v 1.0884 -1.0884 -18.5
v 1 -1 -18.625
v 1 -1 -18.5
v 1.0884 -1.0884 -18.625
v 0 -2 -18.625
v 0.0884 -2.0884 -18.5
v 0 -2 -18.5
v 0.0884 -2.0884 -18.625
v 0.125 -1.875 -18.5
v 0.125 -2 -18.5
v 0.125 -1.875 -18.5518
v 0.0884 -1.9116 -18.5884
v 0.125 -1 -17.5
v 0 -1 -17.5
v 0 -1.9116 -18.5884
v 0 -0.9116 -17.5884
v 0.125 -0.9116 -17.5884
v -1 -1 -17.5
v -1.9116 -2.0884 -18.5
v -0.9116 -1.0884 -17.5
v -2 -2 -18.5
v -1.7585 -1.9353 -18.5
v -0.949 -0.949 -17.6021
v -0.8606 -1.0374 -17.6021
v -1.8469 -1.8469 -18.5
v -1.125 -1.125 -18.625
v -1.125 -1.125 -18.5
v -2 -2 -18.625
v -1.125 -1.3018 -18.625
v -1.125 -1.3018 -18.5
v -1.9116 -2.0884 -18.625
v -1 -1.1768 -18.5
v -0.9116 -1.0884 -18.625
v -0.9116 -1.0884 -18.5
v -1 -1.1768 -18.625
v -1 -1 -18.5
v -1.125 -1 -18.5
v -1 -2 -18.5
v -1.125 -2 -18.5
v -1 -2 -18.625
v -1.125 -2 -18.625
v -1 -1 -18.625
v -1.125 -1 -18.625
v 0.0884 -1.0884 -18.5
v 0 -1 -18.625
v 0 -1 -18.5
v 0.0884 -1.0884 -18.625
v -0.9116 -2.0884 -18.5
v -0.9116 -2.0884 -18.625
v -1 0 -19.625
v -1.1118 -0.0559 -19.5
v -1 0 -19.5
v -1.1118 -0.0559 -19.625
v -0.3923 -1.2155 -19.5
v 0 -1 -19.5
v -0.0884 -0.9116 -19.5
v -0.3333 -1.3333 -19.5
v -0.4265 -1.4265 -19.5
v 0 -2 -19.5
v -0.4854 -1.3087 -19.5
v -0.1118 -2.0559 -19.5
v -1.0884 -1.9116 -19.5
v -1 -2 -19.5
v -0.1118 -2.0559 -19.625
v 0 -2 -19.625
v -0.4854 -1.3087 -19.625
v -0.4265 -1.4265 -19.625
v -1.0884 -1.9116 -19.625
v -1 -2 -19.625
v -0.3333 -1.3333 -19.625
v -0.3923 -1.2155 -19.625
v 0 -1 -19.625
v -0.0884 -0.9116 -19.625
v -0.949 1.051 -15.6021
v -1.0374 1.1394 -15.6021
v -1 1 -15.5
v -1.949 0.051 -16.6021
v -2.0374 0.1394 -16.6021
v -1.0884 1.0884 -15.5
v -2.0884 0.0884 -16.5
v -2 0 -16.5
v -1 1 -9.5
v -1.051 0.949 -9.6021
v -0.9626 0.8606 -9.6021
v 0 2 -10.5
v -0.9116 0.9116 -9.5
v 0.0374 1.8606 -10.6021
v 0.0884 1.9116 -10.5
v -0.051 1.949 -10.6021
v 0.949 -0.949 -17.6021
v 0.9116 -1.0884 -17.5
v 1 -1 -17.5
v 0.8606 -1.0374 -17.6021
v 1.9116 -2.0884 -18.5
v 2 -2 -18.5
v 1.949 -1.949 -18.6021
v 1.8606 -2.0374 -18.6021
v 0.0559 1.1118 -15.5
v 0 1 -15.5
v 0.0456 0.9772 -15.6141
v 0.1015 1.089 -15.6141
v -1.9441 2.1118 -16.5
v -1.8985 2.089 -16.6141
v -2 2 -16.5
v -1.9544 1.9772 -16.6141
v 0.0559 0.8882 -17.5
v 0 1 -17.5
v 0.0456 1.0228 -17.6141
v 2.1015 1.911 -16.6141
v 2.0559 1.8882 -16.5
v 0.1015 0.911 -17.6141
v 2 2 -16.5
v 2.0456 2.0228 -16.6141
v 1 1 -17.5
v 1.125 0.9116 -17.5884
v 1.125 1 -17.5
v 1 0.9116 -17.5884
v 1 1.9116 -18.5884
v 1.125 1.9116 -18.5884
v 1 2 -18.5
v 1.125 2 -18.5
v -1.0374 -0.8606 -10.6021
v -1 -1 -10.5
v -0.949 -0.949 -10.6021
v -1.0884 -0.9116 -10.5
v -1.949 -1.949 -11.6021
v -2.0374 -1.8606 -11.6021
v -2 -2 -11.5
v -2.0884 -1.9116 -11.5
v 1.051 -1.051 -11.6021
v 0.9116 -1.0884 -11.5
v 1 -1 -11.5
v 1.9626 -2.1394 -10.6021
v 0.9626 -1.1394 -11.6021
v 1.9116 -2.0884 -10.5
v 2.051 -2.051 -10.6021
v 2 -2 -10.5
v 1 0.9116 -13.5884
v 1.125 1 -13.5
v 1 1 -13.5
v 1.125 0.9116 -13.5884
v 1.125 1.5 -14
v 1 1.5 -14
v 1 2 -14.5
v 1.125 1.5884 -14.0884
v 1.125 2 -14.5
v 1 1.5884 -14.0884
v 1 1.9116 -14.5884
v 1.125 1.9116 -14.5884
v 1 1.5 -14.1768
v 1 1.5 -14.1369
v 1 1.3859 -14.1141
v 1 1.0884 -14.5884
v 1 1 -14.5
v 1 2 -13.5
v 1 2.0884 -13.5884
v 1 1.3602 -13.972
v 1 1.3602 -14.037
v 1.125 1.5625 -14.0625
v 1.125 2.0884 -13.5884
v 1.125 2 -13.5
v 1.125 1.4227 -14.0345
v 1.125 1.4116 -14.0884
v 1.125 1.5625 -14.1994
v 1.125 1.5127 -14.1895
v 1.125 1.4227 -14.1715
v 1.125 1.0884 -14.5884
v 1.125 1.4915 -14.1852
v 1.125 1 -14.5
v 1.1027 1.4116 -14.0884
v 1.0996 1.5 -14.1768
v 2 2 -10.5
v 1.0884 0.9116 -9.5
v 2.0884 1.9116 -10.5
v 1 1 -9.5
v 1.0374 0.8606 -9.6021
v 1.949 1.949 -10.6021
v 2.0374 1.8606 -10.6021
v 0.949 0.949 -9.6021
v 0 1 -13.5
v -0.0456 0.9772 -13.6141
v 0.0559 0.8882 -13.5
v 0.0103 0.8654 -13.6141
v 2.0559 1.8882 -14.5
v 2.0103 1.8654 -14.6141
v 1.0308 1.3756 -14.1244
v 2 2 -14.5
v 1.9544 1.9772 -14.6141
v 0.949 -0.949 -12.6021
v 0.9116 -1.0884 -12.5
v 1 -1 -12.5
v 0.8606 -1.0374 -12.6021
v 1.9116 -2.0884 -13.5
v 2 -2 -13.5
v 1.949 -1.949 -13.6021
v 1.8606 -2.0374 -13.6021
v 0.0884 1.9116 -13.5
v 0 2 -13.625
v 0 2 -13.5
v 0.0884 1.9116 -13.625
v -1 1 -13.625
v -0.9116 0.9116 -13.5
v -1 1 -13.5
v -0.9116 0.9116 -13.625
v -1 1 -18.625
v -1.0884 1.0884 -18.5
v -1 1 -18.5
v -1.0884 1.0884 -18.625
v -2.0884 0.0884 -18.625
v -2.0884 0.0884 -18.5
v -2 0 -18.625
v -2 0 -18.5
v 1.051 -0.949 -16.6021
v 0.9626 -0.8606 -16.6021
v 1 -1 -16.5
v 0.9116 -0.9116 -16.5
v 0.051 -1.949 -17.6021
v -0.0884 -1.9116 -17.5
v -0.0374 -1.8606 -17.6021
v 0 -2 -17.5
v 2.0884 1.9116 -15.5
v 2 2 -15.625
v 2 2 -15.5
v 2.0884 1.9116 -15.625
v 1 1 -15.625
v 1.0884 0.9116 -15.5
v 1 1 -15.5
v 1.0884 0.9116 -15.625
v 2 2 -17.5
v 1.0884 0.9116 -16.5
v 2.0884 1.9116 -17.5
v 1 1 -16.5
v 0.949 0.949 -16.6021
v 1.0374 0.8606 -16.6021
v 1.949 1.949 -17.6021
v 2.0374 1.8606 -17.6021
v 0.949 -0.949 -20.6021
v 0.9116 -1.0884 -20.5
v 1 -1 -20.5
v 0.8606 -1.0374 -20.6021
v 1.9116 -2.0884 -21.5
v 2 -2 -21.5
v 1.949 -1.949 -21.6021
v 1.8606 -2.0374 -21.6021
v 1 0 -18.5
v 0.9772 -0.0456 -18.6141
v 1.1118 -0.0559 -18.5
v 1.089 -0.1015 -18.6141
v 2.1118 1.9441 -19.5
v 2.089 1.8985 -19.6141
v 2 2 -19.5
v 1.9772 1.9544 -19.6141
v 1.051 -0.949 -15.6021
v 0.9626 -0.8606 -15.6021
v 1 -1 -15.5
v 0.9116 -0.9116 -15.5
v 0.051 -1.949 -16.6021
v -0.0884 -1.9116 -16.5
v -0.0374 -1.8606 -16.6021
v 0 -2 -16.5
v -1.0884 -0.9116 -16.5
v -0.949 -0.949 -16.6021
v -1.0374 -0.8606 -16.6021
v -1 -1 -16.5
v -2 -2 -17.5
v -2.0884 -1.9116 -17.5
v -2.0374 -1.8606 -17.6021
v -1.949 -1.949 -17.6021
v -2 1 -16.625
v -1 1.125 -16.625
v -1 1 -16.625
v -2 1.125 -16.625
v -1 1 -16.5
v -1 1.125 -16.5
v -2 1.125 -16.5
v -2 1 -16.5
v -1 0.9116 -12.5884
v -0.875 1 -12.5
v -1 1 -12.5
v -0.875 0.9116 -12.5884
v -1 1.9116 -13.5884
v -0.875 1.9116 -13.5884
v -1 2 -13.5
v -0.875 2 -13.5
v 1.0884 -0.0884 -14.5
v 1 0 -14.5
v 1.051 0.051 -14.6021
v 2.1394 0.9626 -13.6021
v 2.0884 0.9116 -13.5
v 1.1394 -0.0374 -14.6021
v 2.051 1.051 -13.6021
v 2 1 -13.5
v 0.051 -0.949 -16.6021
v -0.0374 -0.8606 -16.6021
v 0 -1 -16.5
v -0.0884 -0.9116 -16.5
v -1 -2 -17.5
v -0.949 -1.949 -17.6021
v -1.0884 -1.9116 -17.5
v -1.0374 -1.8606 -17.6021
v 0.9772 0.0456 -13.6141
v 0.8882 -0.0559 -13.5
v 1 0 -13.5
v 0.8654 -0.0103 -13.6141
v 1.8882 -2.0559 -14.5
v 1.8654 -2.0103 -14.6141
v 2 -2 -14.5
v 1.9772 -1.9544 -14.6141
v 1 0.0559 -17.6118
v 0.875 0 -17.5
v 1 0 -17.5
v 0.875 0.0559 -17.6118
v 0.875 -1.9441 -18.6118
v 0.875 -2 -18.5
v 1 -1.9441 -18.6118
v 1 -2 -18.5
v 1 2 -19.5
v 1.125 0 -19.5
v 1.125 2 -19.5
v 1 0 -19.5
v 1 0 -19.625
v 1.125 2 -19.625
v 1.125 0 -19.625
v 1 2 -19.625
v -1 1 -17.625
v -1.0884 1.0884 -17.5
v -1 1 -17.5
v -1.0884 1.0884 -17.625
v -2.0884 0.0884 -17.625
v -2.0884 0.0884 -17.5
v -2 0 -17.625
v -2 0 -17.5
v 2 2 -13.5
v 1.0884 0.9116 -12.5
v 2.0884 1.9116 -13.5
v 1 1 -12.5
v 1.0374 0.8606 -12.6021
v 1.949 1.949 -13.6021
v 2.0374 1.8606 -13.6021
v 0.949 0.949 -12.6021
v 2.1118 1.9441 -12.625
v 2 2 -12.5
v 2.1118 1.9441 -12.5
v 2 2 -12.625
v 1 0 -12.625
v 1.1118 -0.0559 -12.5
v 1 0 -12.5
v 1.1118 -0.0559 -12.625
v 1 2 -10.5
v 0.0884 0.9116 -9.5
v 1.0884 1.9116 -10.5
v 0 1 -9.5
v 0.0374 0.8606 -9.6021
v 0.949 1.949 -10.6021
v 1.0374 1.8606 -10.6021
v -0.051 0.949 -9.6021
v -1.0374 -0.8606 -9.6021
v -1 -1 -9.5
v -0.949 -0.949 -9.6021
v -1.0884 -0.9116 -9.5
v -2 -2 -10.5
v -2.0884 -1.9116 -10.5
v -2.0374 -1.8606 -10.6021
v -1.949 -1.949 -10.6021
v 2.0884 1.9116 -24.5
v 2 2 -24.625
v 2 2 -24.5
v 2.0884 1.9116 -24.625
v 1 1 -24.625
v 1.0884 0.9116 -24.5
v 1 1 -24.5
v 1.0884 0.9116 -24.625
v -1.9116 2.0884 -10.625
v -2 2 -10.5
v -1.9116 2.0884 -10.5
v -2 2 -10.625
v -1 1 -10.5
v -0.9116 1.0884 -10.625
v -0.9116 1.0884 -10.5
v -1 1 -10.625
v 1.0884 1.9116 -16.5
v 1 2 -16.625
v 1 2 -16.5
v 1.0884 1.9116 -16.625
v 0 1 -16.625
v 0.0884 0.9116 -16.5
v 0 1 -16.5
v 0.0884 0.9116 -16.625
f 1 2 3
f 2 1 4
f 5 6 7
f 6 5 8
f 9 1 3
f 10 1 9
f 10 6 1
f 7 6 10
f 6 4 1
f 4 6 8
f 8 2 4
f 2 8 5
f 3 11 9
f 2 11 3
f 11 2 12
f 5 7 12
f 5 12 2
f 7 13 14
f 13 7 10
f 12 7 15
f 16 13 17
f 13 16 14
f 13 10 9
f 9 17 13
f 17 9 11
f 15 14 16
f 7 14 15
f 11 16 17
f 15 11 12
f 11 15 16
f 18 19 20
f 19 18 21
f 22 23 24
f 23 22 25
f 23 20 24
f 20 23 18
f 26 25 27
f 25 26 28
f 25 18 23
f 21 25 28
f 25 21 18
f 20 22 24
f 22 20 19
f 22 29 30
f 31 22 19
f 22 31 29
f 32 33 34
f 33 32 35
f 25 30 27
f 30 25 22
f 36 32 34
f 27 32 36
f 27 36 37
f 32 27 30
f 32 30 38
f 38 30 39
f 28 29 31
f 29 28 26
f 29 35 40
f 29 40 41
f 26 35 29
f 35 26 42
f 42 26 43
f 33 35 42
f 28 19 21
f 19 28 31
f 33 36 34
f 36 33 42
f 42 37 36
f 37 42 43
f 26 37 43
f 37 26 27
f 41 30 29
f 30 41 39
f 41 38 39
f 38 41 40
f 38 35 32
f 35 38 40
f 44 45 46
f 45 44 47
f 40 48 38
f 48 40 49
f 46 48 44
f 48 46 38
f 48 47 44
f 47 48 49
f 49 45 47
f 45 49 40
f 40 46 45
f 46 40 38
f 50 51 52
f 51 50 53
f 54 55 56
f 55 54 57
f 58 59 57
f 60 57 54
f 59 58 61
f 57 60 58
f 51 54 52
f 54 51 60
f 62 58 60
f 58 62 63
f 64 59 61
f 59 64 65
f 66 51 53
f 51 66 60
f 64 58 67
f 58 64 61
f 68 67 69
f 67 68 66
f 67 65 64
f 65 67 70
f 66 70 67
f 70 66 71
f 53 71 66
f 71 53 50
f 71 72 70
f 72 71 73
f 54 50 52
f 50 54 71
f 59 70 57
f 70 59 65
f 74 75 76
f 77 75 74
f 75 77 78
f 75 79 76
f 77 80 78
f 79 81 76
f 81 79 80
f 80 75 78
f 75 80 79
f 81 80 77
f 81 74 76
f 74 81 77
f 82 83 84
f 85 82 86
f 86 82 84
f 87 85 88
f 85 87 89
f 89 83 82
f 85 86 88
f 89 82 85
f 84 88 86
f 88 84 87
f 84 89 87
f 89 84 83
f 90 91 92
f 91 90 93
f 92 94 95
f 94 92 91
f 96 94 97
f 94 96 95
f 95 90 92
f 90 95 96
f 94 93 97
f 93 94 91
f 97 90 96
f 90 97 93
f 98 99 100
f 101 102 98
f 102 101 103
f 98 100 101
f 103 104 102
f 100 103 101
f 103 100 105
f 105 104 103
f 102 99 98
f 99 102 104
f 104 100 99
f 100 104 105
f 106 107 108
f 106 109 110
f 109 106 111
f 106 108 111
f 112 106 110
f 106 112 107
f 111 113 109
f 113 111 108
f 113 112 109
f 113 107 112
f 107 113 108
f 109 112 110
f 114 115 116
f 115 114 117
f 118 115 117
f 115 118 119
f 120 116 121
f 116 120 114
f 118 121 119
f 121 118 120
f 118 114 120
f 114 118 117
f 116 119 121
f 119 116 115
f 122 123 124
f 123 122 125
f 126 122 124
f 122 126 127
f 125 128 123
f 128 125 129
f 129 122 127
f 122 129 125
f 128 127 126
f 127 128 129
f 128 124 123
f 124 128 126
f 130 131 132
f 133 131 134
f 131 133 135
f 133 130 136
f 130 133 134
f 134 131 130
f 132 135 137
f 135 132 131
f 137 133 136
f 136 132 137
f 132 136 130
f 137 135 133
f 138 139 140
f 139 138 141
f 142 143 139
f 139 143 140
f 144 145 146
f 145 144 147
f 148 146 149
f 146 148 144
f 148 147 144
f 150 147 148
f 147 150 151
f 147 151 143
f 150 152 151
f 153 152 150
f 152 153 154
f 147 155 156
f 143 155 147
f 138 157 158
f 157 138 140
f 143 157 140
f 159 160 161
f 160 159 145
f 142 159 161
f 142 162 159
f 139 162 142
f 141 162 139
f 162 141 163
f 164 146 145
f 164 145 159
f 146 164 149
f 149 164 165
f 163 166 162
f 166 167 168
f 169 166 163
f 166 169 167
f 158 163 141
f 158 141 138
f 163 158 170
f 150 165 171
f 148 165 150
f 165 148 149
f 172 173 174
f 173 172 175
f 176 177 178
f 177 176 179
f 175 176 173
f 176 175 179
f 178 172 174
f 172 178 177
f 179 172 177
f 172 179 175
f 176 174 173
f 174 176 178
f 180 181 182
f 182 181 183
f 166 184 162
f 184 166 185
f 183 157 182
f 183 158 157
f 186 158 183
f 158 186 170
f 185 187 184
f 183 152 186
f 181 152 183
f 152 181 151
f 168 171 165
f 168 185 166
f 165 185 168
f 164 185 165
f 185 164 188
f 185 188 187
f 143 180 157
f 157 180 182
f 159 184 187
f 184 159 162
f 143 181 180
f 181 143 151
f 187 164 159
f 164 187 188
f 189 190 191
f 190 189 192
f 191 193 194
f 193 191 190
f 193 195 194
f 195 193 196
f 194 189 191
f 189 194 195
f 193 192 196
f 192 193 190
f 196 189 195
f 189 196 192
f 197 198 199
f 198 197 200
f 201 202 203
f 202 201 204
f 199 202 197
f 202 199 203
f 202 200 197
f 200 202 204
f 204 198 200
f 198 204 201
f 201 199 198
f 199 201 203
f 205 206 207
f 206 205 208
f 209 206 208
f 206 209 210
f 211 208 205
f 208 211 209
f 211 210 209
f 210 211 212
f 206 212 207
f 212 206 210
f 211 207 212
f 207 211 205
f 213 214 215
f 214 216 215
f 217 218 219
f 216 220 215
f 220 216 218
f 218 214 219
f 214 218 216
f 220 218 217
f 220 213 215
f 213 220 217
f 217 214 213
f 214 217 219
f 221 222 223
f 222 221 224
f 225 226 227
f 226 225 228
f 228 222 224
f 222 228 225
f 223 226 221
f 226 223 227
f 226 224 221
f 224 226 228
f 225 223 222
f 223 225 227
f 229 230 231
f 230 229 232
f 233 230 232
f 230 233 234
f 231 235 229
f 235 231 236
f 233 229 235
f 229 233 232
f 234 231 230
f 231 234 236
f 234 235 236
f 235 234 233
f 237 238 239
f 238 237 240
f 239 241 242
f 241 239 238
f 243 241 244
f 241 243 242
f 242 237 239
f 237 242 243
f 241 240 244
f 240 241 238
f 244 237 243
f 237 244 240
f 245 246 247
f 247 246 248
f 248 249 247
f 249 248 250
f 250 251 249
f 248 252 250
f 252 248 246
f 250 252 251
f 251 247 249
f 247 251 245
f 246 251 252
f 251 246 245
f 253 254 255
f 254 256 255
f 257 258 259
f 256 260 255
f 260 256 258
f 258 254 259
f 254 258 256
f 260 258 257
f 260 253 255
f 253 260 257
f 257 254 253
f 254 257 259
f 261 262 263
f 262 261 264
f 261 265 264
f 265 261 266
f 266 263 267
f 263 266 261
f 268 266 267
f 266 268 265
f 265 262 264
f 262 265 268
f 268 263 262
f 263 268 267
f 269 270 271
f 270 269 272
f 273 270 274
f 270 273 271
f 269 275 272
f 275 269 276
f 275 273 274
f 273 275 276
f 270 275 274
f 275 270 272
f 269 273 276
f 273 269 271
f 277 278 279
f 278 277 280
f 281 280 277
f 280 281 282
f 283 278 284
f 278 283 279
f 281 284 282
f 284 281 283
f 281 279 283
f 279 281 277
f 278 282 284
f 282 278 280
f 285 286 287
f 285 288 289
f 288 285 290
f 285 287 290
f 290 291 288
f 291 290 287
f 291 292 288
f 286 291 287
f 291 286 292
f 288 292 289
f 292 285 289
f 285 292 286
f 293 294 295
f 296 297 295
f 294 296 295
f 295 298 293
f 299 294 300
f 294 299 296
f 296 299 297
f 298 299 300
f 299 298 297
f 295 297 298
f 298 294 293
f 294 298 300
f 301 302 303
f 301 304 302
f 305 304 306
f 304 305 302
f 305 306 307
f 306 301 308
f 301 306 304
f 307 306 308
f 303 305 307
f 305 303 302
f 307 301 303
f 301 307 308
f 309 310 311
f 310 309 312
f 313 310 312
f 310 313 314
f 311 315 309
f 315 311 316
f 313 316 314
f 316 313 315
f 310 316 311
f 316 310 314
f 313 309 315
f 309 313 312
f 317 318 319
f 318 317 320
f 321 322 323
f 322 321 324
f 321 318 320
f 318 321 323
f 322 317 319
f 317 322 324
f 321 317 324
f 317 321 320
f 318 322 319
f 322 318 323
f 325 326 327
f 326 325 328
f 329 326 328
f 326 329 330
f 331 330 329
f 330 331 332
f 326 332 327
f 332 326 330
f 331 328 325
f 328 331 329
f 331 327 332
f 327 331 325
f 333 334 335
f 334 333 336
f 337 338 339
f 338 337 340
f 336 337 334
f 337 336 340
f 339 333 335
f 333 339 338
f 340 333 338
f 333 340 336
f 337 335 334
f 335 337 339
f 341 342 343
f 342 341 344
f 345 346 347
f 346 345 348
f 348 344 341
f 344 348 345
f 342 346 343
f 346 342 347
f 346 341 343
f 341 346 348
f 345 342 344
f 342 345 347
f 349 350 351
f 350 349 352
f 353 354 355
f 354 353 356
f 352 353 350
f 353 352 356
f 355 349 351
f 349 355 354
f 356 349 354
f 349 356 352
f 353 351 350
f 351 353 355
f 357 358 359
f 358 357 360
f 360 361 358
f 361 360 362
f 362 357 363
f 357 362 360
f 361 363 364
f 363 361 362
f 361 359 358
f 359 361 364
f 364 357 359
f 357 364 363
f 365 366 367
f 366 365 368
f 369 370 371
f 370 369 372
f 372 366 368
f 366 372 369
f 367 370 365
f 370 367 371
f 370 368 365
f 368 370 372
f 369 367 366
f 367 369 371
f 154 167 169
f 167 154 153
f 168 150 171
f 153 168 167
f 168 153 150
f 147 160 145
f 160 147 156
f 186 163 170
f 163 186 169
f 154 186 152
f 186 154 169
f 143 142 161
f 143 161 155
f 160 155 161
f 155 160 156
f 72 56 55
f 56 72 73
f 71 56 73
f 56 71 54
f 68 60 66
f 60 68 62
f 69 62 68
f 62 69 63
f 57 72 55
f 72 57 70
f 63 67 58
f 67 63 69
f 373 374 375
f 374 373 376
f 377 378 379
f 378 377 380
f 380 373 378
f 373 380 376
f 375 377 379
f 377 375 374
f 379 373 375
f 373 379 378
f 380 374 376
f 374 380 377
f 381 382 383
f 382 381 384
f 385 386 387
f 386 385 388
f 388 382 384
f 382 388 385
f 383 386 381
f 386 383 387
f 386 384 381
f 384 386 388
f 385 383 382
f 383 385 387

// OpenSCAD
translate(v = [-0.5, -0.5, 0]) {
	/*Shell 0*/
	union() {
		%/*Nodes shell 0*/
		union() {
			/*Node $_27*/
			color(alpha = 0.1, c = "yellow") {
				translate(v = [1, -1, -19]) {
					cube(size = [1, 1, 1]);
				}
			}
			/*Node $_70*/
			color(alpha = 0.1, c = "pink") {
				translate(v = [0, -1, -18]) {
					cube(size = [1, 1, 1]);
				}
			}
			/*Node $_28*/
			color(alpha = 0.1, c = "yellow") {
				translate(v = [-1, -1, -18]) {
					cube(size = [1, 1, 1]);
				}
			}
			/*Node $_71*/
			color(alpha = 0.1, c = "pink") {
				translate(v = [-1, -1, -19]) {
					cube(size = [1, 1, 1]);
				}
			}
			/*Node $_29*/
			color(alpha = 0.1, c = "yellow") {
				translate(v = [0, -1, -19]) {
					cube(size = [1, 1, 1]);
				}
			}
			/*Node $_24__0*/
			color(alpha = 0.1, c = "lightblue") {
				translate(v = [-1, 0, -20]) {
					cube(size = [1, 1, 1]);
				}
			}
			/*Node $_13__0*/
			color(alpha = 0.1, c = "lightblue") {
				translate(v = [-1, 1, -16]) {
					cube(size = [1, 1, 1]);
				}
			}
			/*Node $_3__0*/
			color(alpha = 0.1, c = "lightblue") {
				translate(v = [-1, 1, -10]) {
					cube(size = [1, 1, 1]);
				}
			}
			/*Node $_22__0*/
			color(alpha = 0.1, c = "lightblue") {
				translate(v = [1, -1, -18]) {
					cube(size = [1, 1, 1]);
				}
			}
			/*Node $_48__0*/
			color(alpha = 0.1, c = "lightblue") {
				translate(v = [0, 1, -16]) {
					cube(size = [1, 1, 1]);
				}
			}
			/*Node $_57__0*/
			color(alpha = 0.1, c = "lightblue") {
				translate(v = [0, 1, -18]) {
					cube(size = [1, 1, 1]);
				}
			}
			/*Node $_11__0*/
			color(alpha = 0.1, c = "lightblue") {
				translate(v = [1, 1, -18]) {
					cube(size = [1, 1, 1]);
				}
			}
			/*Node $_5__0*/
			color(alpha = 0.1, c = "lightblue") {
				translate(v = [-1, -1, -11]) {
					cube(size = [1, 1, 1]);
				}
			}
			/*Node $_2__0*/
			color(alpha = 0.1, c = "lightblue") {
				translate(v = [1, -1, -12]) {
					cube(size = [1, 1, 1]);
				}
			}
			/*Node $_21__0*/
			color(alpha = 0.1, c = "lightblue") {
				translate(v = [1, 1, -14]) {
					cube(size = [1, 1, 1]);
				}
			}
			/*Node $_17__0*/
			color(alpha = 0.1, c = "lightblue") {
				translate(v = [1, 1, -10]) {
					cube(size = [1, 1, 1]);
				}
			}
			/*Node $_59__0*/
			color(alpha = 0.1, c = "lightblue") {
				translate(v = [0, 1, -14]) {
					cube(size = [1, 1, 1]);
				}
			}
			/*Node $_19__0*/
			color(alpha = 0.1, c = "lightblue") {
				translate(v = [1, -1, -13]) {
					cube(size = [1, 1, 1]);
				}
			}
			/*Node $_26__0*/
			color(alpha = 0.1, c = "lightblue") {
				translate(v = [-1, 1, -14]) {
					cube(size = [1, 1, 1]);
				}
			}
			/*Node $_44__0*/
			color(alpha = 0.1, c = "lightblue") {
				translate(v = [-1, 1, -19]) {
					cube(size = [1, 1, 1]);
				}
			}
			/*Node $_46__0*/
			color(alpha = 0.1, c = "lightblue") {
				translate(v = [1, -1, -17]) {
					cube(size = [1, 1, 1]);
				}
			}
			/*Node $_23__0*/
			color(alpha = 0.1, c = "lightblue") {
				translate(v = [1, 1, -16]) {
					cube(size = [1, 1, 1]);
				}
			}
			/*Node $_10__0*/
			color(alpha = 0.1, c = "lightblue") {
				translate(v = [1, 1, -17]) {
					cube(size = [1, 1, 1]);
				}
			}
			/*Node $_8__0*/
			color(alpha = 0.1, c = "lightblue") {
				translate(v = [1, -1, -21]) {
					cube(size = [1, 1, 1]);
				}
			}
			/*Node $_25__0*/
			color(alpha = 0.1, c = "lightblue") {
				translate(v = [1, 0, -19]) {
					cube(size = [1, 1, 1]);
				}
			}
			/*Node $_76__0*/
			color(alpha = 0.1, c = "lightblue") {
				translate(v = [1, -1, -16]) {
					cube(size = [1, 1, 1]);
				}
			}
			/*Node thing.chamber[1].thingy.v6__0*/
			color(alpha = 0.1, c = "lightblue") {
				translate(v = [-1, -1, -17]) {
					cube(size = [1, 1, 1]);
				}
			}
			/*Node thing.chamber[1].thingy.v4__0*/
			color(alpha = 0.1, c = "lightblue") {
				translate(v = [-1, 1, -17]) {
					cube(size = [1, 1, 1]);
				}
			}
			/*Node $_85__0*/
			color(alpha = 0.1, c = "lightblue") {
				translate(v = [-1, 1, -13]) {
					cube(size = [1, 1, 1]);
				}
			}
			/*Node $_56__0*/
			color(alpha = 0.1, c = "lightblue") {
				translate(v = [1, 0, -15]) {
					cube(size = [1, 1, 1]);
				}
			}
			/*Node $_20__0*/
			color(alpha = 0.1, c = "lightblue") {
				translate(v = [0, -1, -17]) {
					cube(size = [1, 1, 1]);
				}
			}
			/*Node $_6__0*/
			color(alpha = 0.1, c = "lightblue") {
				translate(v = [1, 0, -14]) {
					cube(size = [1, 1, 1]);
				}
			}
			/*Node $_15__0*/
			color(alpha = 0.1, c = "lightblue") {
				translate(v = [1, 0, -18]) {
					cube(size = [1, 1, 1]);
				}
			}
			/*Node $_53__0*/
			color(alpha = 0.1, c = "lightblue") {
				translate(v = [1, 0, -20]) {
					cube(size = [1, 1, 1]);
				}
			}
			/*Node $_14__0*/
			color(alpha = 0.1, c = "lightblue") {
				translate(v = [-1, 1, -18]) {
					cube(size = [1, 1, 1]);
				}
			}
			/*Node $_12__0*/
			color(alpha = 0.1, c = "lightblue") {
				translate(v = [1, 1, -13]) {
					cube(size = [1, 1, 1]);
				}
			}
			/*Node $_86__0*/
			color(alpha = 0.1, c = "lightblue") {
				translate(v = [1, 0, -13]) {
					cube(size = [1, 1, 1]);
				}
			}
			/*Node $_4__0*/
			color(alpha = 0.1, c = "lightblue") {
				translate(v = [0, 1, -10]) {
					cube(size = [1, 1, 1]);
				}
			}
			/*Node $_16__0*/
			color(alpha = 0.1, c = "lightblue") {
				translate(v = [-1, -1, -10]) {
					cube(size = [1, 1, 1]);
				}
			}
			/*Node $_55__0*/
			color(alpha = 0.1, c = "lightblue") {
				translate(v = [1, 1, -25]) {
					cube(size = [1, 1, 1]);
				}
			}
			/*Node $_9__0*/
			color(alpha = 0.1, c = "lightblue") {
				translate(v = [1, 1, -15]) {
					cube(size = [1, 1, 1]);
				}
			}
			/*Node thing.chamber[1].thingy.v8__0*/
			color(alpha = 0.1, c = "lightblue") {
				translate(v = [0, -1, -20]) {
					cube(size = [1, 1, 1]);
				}
			}
			/*Node $_18__0*/
			color(alpha = 0.1, c = "lightblue") {
				translate(v = [-1, 1, -11]) {
					cube(size = [1, 1, 1]);
				}
			}
			/*Node $_7__0*/
			color(alpha = 0.1, c = "lightblue") {
				translate(v = [0, 1, -17]) {
					cube(size = [1, 1, 1]);
				}
			}
		}
		/*Edges shell 0*/
		union() {
			/*Edge 27 from thing.chamber[1].thingy.p0 to $_27*/
			translate(v = [1.5, -0.5, -18.5]) {
				rotate(a = [0, 90.0, -135.0]) {
					cube(size = [0.125, 0.125, 1.4142135623730951]);
				}
			}
			/*Edge 70 from thing.chamber[1].thingy.p0 to $_70*/
			translate(v = [0.5, -0.5, -17.5]) {
				rotate(a = [0, 135.0, -90.0]) {
					cube(size = [0.125, 0.125, 1.4142135623730951]);
				}
			}
			/*Edge 28 from thing.chamber[1].thingy.p1 to $_28*/
			translate(v = [-0.5, -0.5, -17.5]) {
				rotate(a = [0, 125.26438968275465, -135.0]) {
					cube(size = [0.125, 0.125, 1.7320508075688772]);
				}
			}
			/*Edge 71 from thing.chamber[1].thingy.p1 to $_71*/
			translate(v = [-0.5, -0.5, -18.5]) {
				rotate(a = [0, 90.0, -135.0]) {
					cube(size = [0.125, 0.125, 1.4142135623730951]);
				}
			}
			/*Edge 71 from $_71 to thing.chamber[1].thingy.p2*/
			translate(v = [-0.5, -1.5, -18.5]) {
				rotate(a = [0, 90.0, 90.0]) {
					cube(size = [0.125, 0.125, 1.0]);
				}
			}
			/*Edge 29 from thing.chamber[1].thingy.p2 to $_29*/
			translate(v = [0.5, -0.5, -18.5]) {
				rotate(a = [0, 90.0, -135.0]) {
					cube(size = [0.125, 0.125, 1.4142135623730951]);
				}
			}
			/*Edge -1 from $_24__0 to $_24__1*/
			translate(v = [0.5, -1.5, -19.5]) {
				rotate(a = [0, 90.0, 116.56505117707799]) {
					cube(size = [0.125, 0.125, 2.23606797749979]);
				}
			}
			/*Edge -1 from $_13__0 to $_13__1*/
			translate(v = [-1.5, 0.5, -16.5]) {
				rotate(a = [0, 54.735610317245346, 45.0]) {
					cube(size = [0.125, 0.125, 1.7320508075688772]);
				}
			}
			/*Edge -1 from $_3__0 to $_3__1*/
			translate(v = [0.5, 2.5, -10.5]) {
				rotate(a = [0, 54.735610317245346, -135.0]) {
					cube(size = [0.125, 0.125, 1.7320508075688772]);
				}
			}
			/*Edge -1 from $_22__0 to $_22__1*/
			translate(v = [2.5, -1.5, -18.5]) {
				rotate(a = [0, 54.735610317245346, 135.0]) {
					cube(size = [0.125, 0.125, 1.7320508075688772]);
				}
			}
			/*Edge -1 from $_48__0 to $_48__1*/
			translate(v = [-1.5, 2.5, -16.5]) {
				rotate(a = [0, 65.9051574478893, -26.56505117707799]) {
					cube(size = [0.125, 0.125, 2.449489742783178]);
				}
			}
			/*Edge -1 from $_57__0 to $_57__1*/
			translate(v = [2.5, 2.5, -16.5]) {
				rotate(a = [0, 114.09484255211072, -153.43494882292202]) {
					cube(size = [0.125, 0.125, 2.449489742783178]);
				}
			}
			/*Edge -1 from $_11__0 to $_11__1*/
			translate(v = [1.5, 2.5, -18.5]) {
				rotate(a = [0, 45.00000000000001, -90.0]) {
					cube(size = [0.125, 0.125, 1.4142135623730951]);
				}
			}
			/*Edge -1 from $_5__0 to $_5__1*/
			translate(v = [-1.5, -1.5, -11.5]) {
				rotate(a = [0, 54.735610317245346, 45.0]) {
					cube(size = [0.125, 0.125, 1.7320508075688772]);
				}
			}
			/*Edge -1 from $_2__0 to $_2__1*/
			translate(v = [2.5, -1.5, -10.5]) {
				rotate(a = [0, 125.26438968275465, 135.0]) {
					cube(size = [0.125, 0.125, 1.7320508075688772]);
				}
			}
			/*Edge -1 from $_21__0 to $_21__1*/
			translate(v = [1.5, 2.5, -14.5]) {
				rotate(a = [0, 45.00000000000001, -90.0]) {
					cube(size = [0.125, 0.125, 1.4142135623730951]);
				}
			}
			/*Edge -1 from $_17__0 to $_17__1*/
			translate(v = [2.5, 2.5, -10.5]) {
				rotate(a = [0, 54.735610317245346, -135.0]) {
					cube(size = [0.125, 0.125, 1.7320508075688772]);
				}
			}
			/*Edge -1 from $_59__0 to $_59__1*/
			translate(v = [2.5, 2.5, -14.5]) {
				rotate(a = [0, 65.9051574478893, -153.43494882292202]) {
					cube(size = [0.125, 0.125, 2.449489742783178]);
				}
			}
			/*Edge -1 from $_19__0 to $_19__1*/
			translate(v = [2.5, -1.5, -13.5]) {
				rotate(a = [0, 54.735610317245346, 135.0]) {
					cube(size = [0.125, 0.125, 1.7320508075688772]);
				}
			}
			/*Edge -1 from $_26__0 to $_26__1*/
			translate(v = [0.5, 2.5, -13.5]) {
				rotate(a = [0, 90.0, -135.0]) {
					cube(size = [0.125, 0.125, 1.4142135623730951]);
				}
			}
			/*Edge -1 from $_44__0 to $_44__1*/
			translate(v = [-1.5, 0.5, -18.5]) {
				rotate(a = [0, 90.0, 45.0]) {
					cube(size = [0.125, 0.125, 1.4142135623730951]);
				}
			}
			/*Edge -1 from $_46__0 to $_46__1*/
			translate(v = [0.5, -1.5, -17.5]) {
				rotate(a = [0, 54.735610317245346, 45.0]) {
					cube(size = [0.125, 0.125, 1.7320508075688772]);
				}
			}
			/*Edge -1 from $_23__0 to $_23__1*/
			translate(v = [2.5, 2.5, -15.5]) {
				rotate(a = [0, 90.0, -135.0]) {
					cube(size = [0.125, 0.125, 1.4142135623730951]);
				}
			}
			/*Edge -1 from $_10__0 to $_10__1*/
			translate(v = [2.5, 2.5, -17.5]) {
				rotate(a = [0, 54.735610317245346, -135.0]) {
					cube(size = [0.125, 0.125, 1.7320508075688772]);
				}
			}
			/*Edge -1 from $_8__0 to $_8__1*/
			translate(v = [2.5, -1.5, -21.5]) {
				rotate(a = [0, 54.735610317245346, 135.0]) {
					cube(size = [0.125, 0.125, 1.7320508075688772]);
				}
			}
			/*Edge -1 from $_25__0 to $_25__1*/
			translate(v = [2.5, 2.5, -19.5]) {
				rotate(a = [0, 65.9051574478893, -116.56505117707799]) {
					cube(size = [0.125, 0.125, 2.449489742783178]);
				}
			}
			/*Edge -1 from $_76__0 to $_76__1*/
			translate(v = [0.5, -1.5, -16.5]) {
				rotate(a = [0, 54.735610317245346, 45.0]) {
					cube(size = [0.125, 0.125, 1.7320508075688772]);
				}
			}
			/*Edge -1 from thing.chamber[1].thingy.v6__0 to thing.chamber[1].thingy.v6__1*/
			translate(v = [-1.5, -1.5, -17.5]) {
				rotate(a = [0, 54.735610317245346, 45.0]) {
					cube(size = [0.125, 0.125, 1.7320508075688772]);
				}
			}
			/*Edge -1 from thing.chamber[1].thingy.v4__0 to thing.chamber[1].thingy.v4__1*/
			translate(v = [-1.5, 1.5, -16.5]) {
				rotate(a = [0, 90.0, 0.0]) {
					cube(size = [0.125, 0.125, 1.0]);
				}
			}
			/*Edge -1 from $_85__0 to $_85__1*/
			translate(v = [-0.5, 2.5, -13.5]) {
				rotate(a = [0, 45.00000000000001, -90.0]) {
					cube(size = [0.125, 0.125, 1.4142135623730951]);
				}
			}
			/*Edge -1 from $_56__0 to $_56__1*/
			translate(v = [2.5, 1.5, -13.5]) {
				rotate(a = [0, 125.26438968275465, -135.0]) {
					cube(size = [0.125, 0.125, 1.7320508075688772]);
				}
			}
			/*Edge -1 from $_20__0 to $_20__1*/
			translate(v = [-0.5, -1.5, -17.5]) {
				rotate(a = [0, 54.735610317245346, 45.0]) {
					cube(size = [0.125, 0.125, 1.7320508075688772]);
				}
			}
			/*Edge -1 from $_6__0 to $_6__1*/
			translate(v = [2.5, -1.5, -14.5]) {
				rotate(a = [0, 65.9051574478893, 116.56505117707799]) {
					cube(size = [0.125, 0.125, 2.449489742783178]);
				}
			}
			/*Edge -1 from $_15__0 to $_15__1*/
			translate(v = [1.5, -1.5, -18.5]) {
				rotate(a = [0, 63.43494882292201, 90.0]) {
					cube(size = [0.125, 0.125, 2.23606797749979]);
				}
			}
			/*Edge -1 from $_53__0 to $_53__1*/
			translate(v = [1.5, 2.5, -19.5]) {
				rotate(a = [0, 90.0, -90.0]) {
					cube(size = [0.125, 0.125, 2.0]);
				}
			}
			/*Edge -1 from $_14__0 to $_14__1*/
			translate(v = [-1.5, 0.5, -17.5]) {
				rotate(a = [0, 90.0, 45.0]) {
					cube(size = [0.125, 0.125, 1.4142135623730951]);
				}
			}
			/*Edge -1 from $_12__0 to $_12__1*/
			translate(v = [2.5, 2.5, -13.5]) {
				rotate(a = [0, 54.735610317245346, -135.0]) {
					cube(size = [0.125, 0.125, 1.7320508075688772]);
				}
			}
			/*Edge -1 from $_86__0 to $_86__1*/
			translate(v = [2.5, 2.5, -12.5]) {
				rotate(a = [0, 90.0, -116.56505117707799]) {
					cube(size = [0.125, 0.125, 2.23606797749979]);
				}
			}
			/*Edge -1 from $_4__0 to $_4__1*/
			translate(v = [1.5, 2.5, -10.5]) {
				rotate(a = [0, 54.735610317245346, -135.0]) {
					cube(size = [0.125, 0.125, 1.7320508075688772]);
				}
			}
			/*Edge -1 from $_16__0 to $_16__1*/
			translate(v = [-1.5, -1.5, -10.5]) {
				rotate(a = [0, 54.735610317245346, 45.0]) {
					cube(size = [0.125, 0.125, 1.7320508075688772]);
				}
			}
			/*Edge -1 from $_55__0 to $_55__1*/
			translate(v = [2.5, 2.5, -24.5]) {
				rotate(a = [0, 90.0, -135.0]) {
					cube(size = [0.125, 0.125, 1.4142135623730951]);
				}
			}
			/*Edge -1 from $_9__0 to $_9__1*/
			translate(v = [1.5, 2.5, -13.5]) {
				rotate(a = [0, 135.0, -90.0]) {
					cube(size = [0.125, 0.125, 1.4142135623730951]);
				}
			}
			/*Edge -1 from thing.chamber[1].thingy.v8__0 to thing.chamber[1].thingy.v8__1*/
			translate(v = [-0.5, -1.5, -19.5]) {
				rotate(a = [0, 90.0, 45.0]) {
					cube(size = [0.125, 0.125, 1.4142135623730951]);
				}
			}
			/*Edge -1 from $_18__0 to $_18__1*/
			translate(v = [-1.5, 2.5, -10.5]) {
				rotate(a = [0, 90.0, -45.0]) {
					cube(size = [0.125, 0.125, 1.4142135623730951]);
				}
			}
			/*Edge -1 from $_7__0 to $_7__1*/
			translate(v = [1.5, 2.5, -16.5]) {
				rotate(a = [0, 90.0, -135.0]) {
					cube(size = [0.125, 0.125, 1.4142135623730951]);
				}
			}
		}
	}
	/*Shell 1*/
	union() {
		%/*Nodes shell 1*/
		union() {
			/*Node thing.chamber[1].thingy.p0*/
			color(alpha = 0.1, c = "black") {
				translate(v = [0, -2, -19]) {
					cube(size = [1, 1, 1]);
				}
			}
			/*Node thing.chamber[1].thingy.p1*/
			color(alpha = 0.1, c = "black") {
				translate(v = [-2, -2, -19]) {
					cube(size = [1, 1, 1]);
				}
			}
			/*Node thing.chamber[1].thingy.p2*/
			color(alpha = 0.1, c = "black") {
				translate(v = [-1, -2, -19]) {
					cube(size = [1, 1, 1]);
				}
			}
			/*Node $_24__1*/
			color(alpha = 0.1, c = "lightblue") {
				translate(v = [0, -2, -20]) {
					cube(size = [1, 1, 1]);
				}
			}
			/*Node $_13__1*/
			color(alpha = 0.1, c = "lightblue") {
				translate(v = [-2, 0, -17]) {
					cube(size = [1, 1, 1]);
				}
			}
			/*Node $_3__1*/
			color(alpha = 0.1, c = "lightblue") {
				translate(v = [0, 2, -11]) {
					cube(size = [1, 1, 1]);
				}
			}
			/*Node $_22__1*/
			color(alpha = 0.1, c = "lightblue") {
				translate(v = [2, -2, -19]) {
					cube(size = [1, 1, 1]);
				}
			}
			/*Node $_48__1*/
			color(alpha = 0.1, c = "lightblue") {
				translate(v = [-2, 2, -17]) {
					cube(size = [1, 1, 1]);
				}
			}
			/*Node $_57__1*/
			color(alpha = 0.1, c = "lightblue") {
				translate(v = [2, 2, -17]) {
					cube(size = [1, 1, 1]);
				}
			}
			/*Node $_11__1*/
			color(alpha = 0.1, c = "lightblue") {
				translate(v = [1, 2, -19]) {
					cube(size = [1, 1, 1]);
				}
			}
			/*Node $_5__1*/
			color(alpha = 0.1, c = "lightblue") {
				translate(v = [-2, -2, -12]) {
					cube(size = [1, 1, 1]);
				}
			}
			/*Node $_2__1*/
			color(alpha = 0.1, c = "lightblue") {
				translate(v = [2, -2, -11]) {
					cube(size = [1, 1, 1]);
				}
			}
			/*Node $_21__1*/
			color(alpha = 0.1, c = "lightblue") {
				translate(v = [1, 2, -15]) {
					cube(size = [1, 1, 1]);
				}
			}
			/*Node $_17__1*/
			color(alpha = 0.1, c = "lightblue") {
				translate(v = [2, 2, -11]) {
					cube(size = [1, 1, 1]);
				}
			}
			/*Node $_59__1*/
			color(alpha = 0.1, c = "lightblue") {
				translate(v = [2, 2, -15]) {
					cube(size = [1, 1, 1]);
				}
			}
			/*Node $_19__1*/
			color(alpha = 0.1, c = "lightblue") {
				translate(v = [2, -2, -14]) {
					cube(size = [1, 1, 1]);
				}
			}
			/*Node $_26__1*/
			color(alpha = 0.1, c = "lightblue") {
				translate(v = [0, 2, -14]) {
					cube(size = [1, 1, 1]);
				}
			}
			/*Node $_44__1*/
			color(alpha = 0.1, c = "lightblue") {
				translate(v = [-2, 0, -19]) {
					cube(size = [1, 1, 1]);
				}
			}
			/*Node $_46__1*/
			color(alpha = 0.1, c = "lightblue") {
				translate(v = [0, -2, -18]) {
					cube(size = [1, 1, 1]);
				}
			}
			/*Node $_23__1*/
			color(alpha = 0.1, c = "lightblue") {
				translate(v = [2, 2, -16]) {
					cube(size = [1, 1, 1]);
				}
			}
			/*Node $_10__1*/
			color(alpha = 0.1, c = "lightblue") {
				translate(v = [2, 2, -18]) {
					cube(size = [1, 1, 1]);
				}
			}
			/*Node $_8__1*/
			color(alpha = 0.1, c = "lightblue") {
				translate(v = [2, -2, -22]) {
					cube(size = [1, 1, 1]);
				}
			}
			/*Node $_25__1*/
			color(alpha = 0.1, c = "lightblue") {
				translate(v = [2, 2, -20]) {
					cube(size = [1, 1, 1]);
				}
			}
			/*Node $_76__1*/
			color(alpha = 0.1, c = "lightblue") {
				translate(v = [0, -2, -17]) {
					cube(size = [1, 1, 1]);
				}
			}
			/*Node thing.chamber[1].thingy.v6__1*/
			color(alpha = 0.1, c = "lightblue") {
				translate(v = [-2, -2, -18]) {
					cube(size = [1, 1, 1]);
				}
			}
			/*Node thing.chamber[1].thingy.v4__1*/
			color(alpha = 0.1, c = "lightblue") {
				translate(v = [-2, 1, -17]) {
					cube(size = [1, 1, 1]);
				}
			}
			/*Node $_85__1*/
			color(alpha = 0.1, c = "lightblue") {
				translate(v = [-1, 2, -14]) {
					cube(size = [1, 1, 1]);
				}
			}
			/*Node $_56__1*/
			color(alpha = 0.1, c = "lightblue") {
				translate(v = [2, 1, -14]) {
					cube(size = [1, 1, 1]);
				}
			}
			/*Node $_20__1*/
			color(alpha = 0.1, c = "lightblue") {
				translate(v = [-1, -2, -18]) {
					cube(size = [1, 1, 1]);
				}
			}
			/*Node $_6__1*/
			color(alpha = 0.1, c = "lightblue") {
				translate(v = [2, -2, -15]) {
					cube(size = [1, 1, 1]);
				}
			}
			/*Node $_15__1*/
			color(alpha = 0.1, c = "lightblue") {
				translate(v = [1, -2, -19]) {
					cube(size = [1, 1, 1]);
				}
			}
			/*Node $_53__1*/
			color(alpha = 0.1, c = "lightblue") {
				translate(v = [1, 2, -20]) {
					cube(size = [1, 1, 1]);
				}
			}
			/*Node $_14__1*/
			color(alpha = 0.1, c = "lightblue") {
				translate(v = [-2, 0, -18]) {
					cube(size = [1, 1, 1]);
				}
			}
			/*Node $_12__1*/
			color(alpha = 0.1, c = "lightblue") {
				translate(v = [2, 2, -14]) {
					cube(size = [1, 1, 1]);
				}
			}
			/*Node $_86__1*/
			color(alpha = 0.1, c = "lightblue") {
				translate(v = [2, 2, -13]) {
					cube(size = [1, 1, 1]);
				}
			}
			/*Node $_4__1*/
			color(alpha = 0.1, c = "lightblue") {
				translate(v = [1, 2, -11]) {
					cube(size = [1, 1, 1]);
				}
			}
			/*Node $_16__1*/
			color(alpha = 0.1, c = "lightblue") {
				translate(v = [-2, -2, -11]) {
					cube(size = [1, 1, 1]);
				}
			}
			/*Node $_55__1*/
			color(alpha = 0.1, c = "lightblue") {
				translate(v = [2, 2, -25]) {
					cube(size = [1, 1, 1]);
				}
			}
			/*Node $_9__1*/
			color(alpha = 0.1, c = "lightblue") {
				translate(v = [1, 2, -14]) {
					cube(size = [1, 1, 1]);
				}
			}
			/*Node thing.chamber[1].thingy.v8__1*/
			color(alpha = 0.1, c = "lightblue") {
				translate(v = [-1, -2, -20]) {
					cube(size = [1, 1, 1]);
				}
			}
			/*Node $_18__1*/
			color(alpha = 0.1, c = "lightblue") {
				translate(v = [-2, 2, -11]) {
					cube(size = [1, 1, 1]);
				}
			}
			/*Node $_7__1*/
			color(alpha = 0.1, c = "lightblue") {
				translate(v = [1, 2, -17]) {
					cube(size = [1, 1, 1]);
				}
			}
		}
		/*Edges shell 1*/
		union();
	}
	/*Shell 2*/
	union() {
		%/*Nodes shell 2*/
		union();
		/*Edges shell 2*/
		union();
	}
	/*Shell 3*/
	union() {
		%/*Nodes shell 3*/
		union() {
			/*Node thing.chamber[0].thingy.p0*/
			color(alpha = 0.1, c = "black") {
				translate(v = [3, -4, -2]) {
					cube(size = [1, 1, 1]);
				}
			}
			/*Node thing.chamber[0].thingy.p1*/
			color(alpha = 0.1, c = "black") {
				translate(v = [2, -4, -2]) {
					cube(size = [1, 1, 1]);
				}
			}
			/*Node thing.chamber[0].thingy.p2*/
			color(alpha = 0.1, c = "black") {
				translate(v = [1, -4, -2]) {
					cube(size = [1, 1, 1]);
				}
			}
			/*Node thing.chamber[1].thingy.v10*/
			color(alpha = 0.1, c = "black") {
				translate(v = [1, -4, -1]) {
					cube(size = [1, 1, 1]);
				}
			}
			/*Node thing.chamber[1].thingy.v2*/
			color(alpha = 0.1, c = "black") {
				translate(v = [-1, -4, -5]) {
					cube(size = [1, 1, 1]);
				}
			}
			/*Node thing.chamber[1].thingy.v3*/
			color(alpha = 0.1, c = "black") {
				translate(v = [2, -4, -3]) {
					cube(size = [1, 1, 1]);
				}
			}
			/*Node thing.chamber[1].thingy.v4*/
			color(alpha = 0.1, c = "black") {
				translate(v = [1, -4, -3]) {
					cube(size = [1, 1, 1]);
				}
			}
			/*Node thing.chamber[1].thingy.v6*/
			color(alpha = 0.1, c = "black") {
				translate(v = [1, -4, -4]) {
					cube(size = [1, 1, 1]);
				}
			}
			/*Node thing.chamber[1].thingy.v8*/
			color(alpha = 0.1, c = "black") {
				translate(v = [2, -4, 0]) {
					cube(size = [1, 1, 1]);
				}
			}
			/*Node $_3__3*/
			color(alpha = 0.1, c = "lightblue") {
				translate(v = [2, -4, -7]) {
					cube(size = [1, 1, 1]);
				}
			}
			/*Node $_22__3*/
			color(alpha = 0.1, c = "lightblue") {
				translate(v = [4, -4, 3]) {
					cube(size = [1, 1, 1]);
				}
			}
			/*Node $_48__3*/
			color(alpha = 0.1, c = "lightblue") {
				translate(v = [2, -4, -5]) {
					cube(size = [1, 1, 1]);
				}
			}
			/*Node $_57__3*/
			color(alpha = 0.1, c = "lightblue") {
				translate(v = [3, -4, -4]) {
					cube(size = [1, 1, 1]);
				}
			}
			/*Node $_11__3*/
			color(alpha = 0.1, c = "lightblue") {
				translate(v = [1, -4, 1]) {
					cube(size = [1, 1, 1]);
				}
			}
			/*Node $_5__3*/
			color(alpha = 0.1, c = "lightblue") {
				translate(v = [0, -4, -5]) {
					cube(size = [1, 1, 1]);
				}
			}
			/*Node $_2__3*/
			color(alpha = 0.1, c = "lightblue") {
				translate(v = [2, -4, -1]) {
					cube(size = [1, 1, 1]);
				}
			}
			/*Node $_21__3*/
			color(alpha = 0.1, c = "lightblue") {
				translate(v = [3, -4, -3]) {
					cube(size = [1, 1, 1]);
				}
			}
			/*Node $_17__3*/
			color(alpha = 0.1, c = "lightblue") {
				translate(v = [0, -4, -3]) {
					cube(size = [1, 1, 1]);
				}
			}
			/*Node $_59__3*/
			color(alpha = 0.1, c = "lightblue") {
				translate(v = [2, -4, -4]) {
					cube(size = [1, 1, 1]);
				}
			}
			/*Node $_19__3*/
			color(alpha = 0.1, c = "lightblue") {
				translate(v = [4, 0, 0]) {
					cube(size = [1, 1, 1]);
				}
			}
			/*Node $_26__3*/
			color(alpha = 0.1, c = "lightblue") {
				translate(v = [-1, -4, 3]) {
					cube(size = [1, 1, 1]);
				}
			}
			/*Node $_23__3*/
			color(alpha = 0.1, c = "lightblue") {
				translate(v = [3, -4, 0]) {
					cube(size = [1, 1, 1]);
				}
			}
			/*Node $_10__3*/
			color(alpha = 0.1, c = "lightblue") {
				translate(v = [-1, -4, 0]) {
					cube(size = [1, 1, 1]);
				}
			}
			/*Node $_8__3*/
			color(alpha = 0.1, c = "lightblue") {
				translate(v = [0, -4, 0]) {
					cube(size = [1, 1, 1]);
				}
			}
			/*Node $_25__3*/
			color(alpha = 0.1, c = "lightblue") {
				translate(v = [1, -4, 0]) {
					cube(size = [1, 1, 1]);
				}
			}
			/*Node $_85__3*/
			color(alpha = 0.1, c = "lightblue") {
				translate(v = [0, -4, -4]) {
					cube(size = [1, 1, 1]);
				}
			}
			/*Node $_56__3*/
			color(alpha = 0.1, c = "lightblue") {
				translate(v = [-3, -4, 1]) {
					cube(size = [1, 1, 1]);
				}
			}
			/*Node $_6__3*/
			color(alpha = 0.1, c = "lightblue") {
				translate(v = [1, -4, -5]) {
					cube(size = [1, 1, 1]);
				}
			}
			/*Node $_53__3*/
			color(alpha = 0.1, c = "lightblue") {
				translate(v = [0, -4, 1]) {
					cube(size = [1, 1, 1]);
				}
			}
			/*Node $_12__3*/
			color(alpha = 0.1, c = "lightblue") {
				translate(v = [-3, -4, 5]) {
					cube(size = [1, 1, 1]);
				}
			}
			/*Node $_86__3*/
			color(alpha = 0.1, c = "lightblue") {
				translate(v = [-1, -4, -1]) {
					cube(size = [1, 1, 1]);
				}
			}
			/*Node $_4__3*/
			color(alpha = 0.1, c = "lightblue") {
				translate(v = [-1, -4, -3]) {
					cube(size = [1, 1, 1]);
				}
			}
			/*Node $_16__3*/
			color(alpha = 0.1, c = "lightblue") {
				translate(v = [3, -4, -1]) {
					cube(size = [1, 1, 1]);
				}
			}
			/*Node $_55__3*/
			color(alpha = 0.1, c = "lightblue") {
				translate(v = [0, -4, 3]) {
					cube(size = [1, 1, 1]);
				}
			}
			/*Node $_9__3*/
			color(alpha = 0.1, c = "lightblue") {
				translate(v = [3, -4, 2]) {
					cube(size = [1, 1, 1]);
				}
			}
			/*Node $_18__3*/
			color(alpha = 0.1, c = "lightblue") {
				translate(v = [3, -4, -7]) {
					cube(size = [1, 1, 1]);
				}
			}
			/*Node $_7__3*/
			color(alpha = 0.1, c = "lightblue") {
				translate(v = [4, -4, -7]) {
					cube(size = [1, 1, 1]);
				}
			}
		}
		/*Edges shell 3*/
		union();
	}
	/*Shell 4*/
	union() {
		%/*Nodes shell 4*/
		union();
		/*Edges shell 4*/
		union();
	}
	/*Shell 5*/
	union() {
		%/*Nodes shell 5*/
		union() {
			/*Node thing.chamber[0].thingy.v1*/
			color(alpha = 0.1, c = "black") {
				translate(v = [4, 6, 23]) {
					cube(size = [1, 1, 1]);
				}
			}
			/*Node thing.chamber[0].thingy.v10*/
			color(alpha = 0.1, c = "black") {
				translate(v = [4, 6, 19]) {
					cube(size = [1, 1, 1]);
				}
			}
			/*Node thing.chamber[0].thingy.v11*/
			color(alpha = 0.1, c = "black") {
				translate(v = [6, 6, 18]) {
					cube(size = [1, 1, 1]);
				}
			}
			/*Node thing.chamber[0].thingy.v2*/
			color(alpha = 0.1, c = "black") {
				translate(v = [4, 6, 22]) {
					cube(size = [1, 1, 1]);
				}
			}
			/*Node thing.chamber[0].thingy.v3*/
			color(alpha = 0.1, c = "black") {
				translate(v = [6, 5, 21]) {
					cube(size = [1, 1, 1]);
				}
			}
			/*Node thing.chamber[0].thingy.v5*/
			color(alpha = 0.1, c = "black") {
				translate(v = [5, 6, 21]) {
					cube(size = [1, 1, 1]);
				}
			}
			/*Node thing.chamber[0].thingy.v7*/
			color(alpha = 0.1, c = "black") {
				translate(v = [6, 4, 22]) {
					cube(size = [1, 1, 1]);
				}
			}
			/*Node thing.chamber[0].thingy.v9*/
			color(alpha = 0.1, c = "black") {
				translate(v = [5, 6, 19]) {
					cube(size = [1, 1, 1]);
				}
			}
			/*Node thing.chamber[1].thingy.v1*/
			color(alpha = 0.1, c = "black") {
				translate(v = [6, 6, 23]) {
					cube(size = [1, 1, 1]);
				}
			}
			/*Node thing.chamber[1].thingy.v11*/
			color(alpha = 0.1, c = "black") {
				translate(v = [6, 5, 19]) {
					cube(size = [1, 1, 1]);
				}
			}
			/*Node thing.chamber[1].thingy.v5*/
			color(alpha = 0.1, c = "black") {
				translate(v = [6, 6, 21]) {
					cube(size = [1, 1, 1]);
				}
			}
			/*Node thing.chamber[1].thingy.v7*/
			color(alpha = 0.1, c = "black") {
				translate(v = [6, 6, 22]) {
					cube(size = [1, 1, 1]);
				}
			}
			/*Node thing.chamber[1].thingy.v9*/
			color(alpha = 0.1, c = "black") {
				translate(v = [4, 6, 20]) {
					cube(size = [1, 1, 1]);
				}
			}
			/*Node $_3__5*/
			color(alpha = 0.1, c = "lightblue") {
				translate(v = [5, 6, 23]) {
					cube(size = [1, 1, 1]);
				}
			}
			/*Node $_22__5*/
			color(alpha = 0.1, c = "lightblue") {
				translate(v = [6, 6, 17]) {
					cube(size = [1, 1, 1]);
				}
			}
			/*Node $_5__5*/
			color(alpha = 0.1, c = "lightblue") {
				translate(v = [6, 6, 19]) {
					cube(size = [1, 1, 1]);
				}
			}
			/*Node $_2__5*/
			color(alpha = 0.1, c = "lightblue") {
				translate(v = [4, 6, 25]) {
					cube(size = [1, 1, 1]);
				}
			}
			/*Node $_17__5*/
			color(alpha = 0.1, c = "lightblue") {
				translate(v = [5, 6, 25]) {
					cube(size = [1, 1, 1]);
				}
			}
			/*Node $_19__5*/
			color(alpha = 0.1, c = "lightblue") {
				translate(v = [4, 6, 21]) {
					cube(size = [1, 1, 1]);
				}
			}
			/*Node $_26__5*/
			color(alpha = 0.1, c = "lightblue") {
				translate(v = [6, 3, 19]) {
					cube(size = [1, 1, 1]);
				}
			}
			/*Node $_8__5*/
			color(alpha = 0.1, c = "lightblue") {
				translate(v = [6, 5, 20]) {
					cube(size = [1, 1, 1]);
				}
			}
			/*Node $_85__5*/
			color(alpha = 0.1, c = "lightblue") {
				translate(v = [6, 6, 20]) {
					cube(size = [1, 1, 1]);
				}
			}
			/*Node $_56__5*/
			color(alpha = 0.1, c = "lightblue") {
				translate(v = [6, 4, 17]) {
					cube(size = [1, 1, 1]);
				}
			}
			/*Node $_12__5*/
			color(alpha = 0.1, c = "lightblue") {
				translate(v = [6, 6, 16]) {
					cube(size = [1, 1, 1]);
				}
			}
			/*Node $_86__5*/
			color(alpha = 0.1, c = "lightblue") {
				translate(v = [6, 4, 21]) {
					cube(size = [1, 1, 1]);
				}
			}
			/*Node $_4__5*/
			color(alpha = 0.1, c = "lightblue") {
				translate(v = [6, 6, 24]) {
					cube(size = [1, 1, 1]);
				}
			}
			/*Node $_16__5*/
			color(alpha = 0.1, c = "lightblue") {
				translate(v = [6, 6, 25]) {
					cube(size = [1, 1, 1]);
				}
			}
			/*Node $_55__5*/
			color(alpha = 0.1, c = "lightblue") {
				translate(v = [6, 4, 18]) {
					cube(size = [1, 1, 1]);
				}
			}
			/*Node $_9__5*/
			color(alpha = 0.1, c = "lightblue") {
				translate(v = [6, 4, 20]) {
					cube(size = [1, 1, 1]);
				}
			}
			/*Node $_18__5*/
			color(alpha = 0.1, c = "lightblue") {
				translate(v = [6, 4, 25]) {
					cube(size = [1, 1, 1]);
				}
			}
			/*Node $_7__5*/
			color(alpha = 0.1, c = "lightblue") {
				translate(v = [3, 6, 22]) {
					cube(size = [1, 1, 1]);
				}
			}
		}
		/*Edges shell 5*/
		union();
	}
	/*Shell 6*/
	union() {
		%/*Nodes shell 6*/
		union();
		/*Edges shell 6*/
		union();
	}
	/*Shell 7*/
	union() {
		%/*Nodes shell 7*/
		union() {
			/*Node thing.chamber[0].thingy.v12*/
			color(alpha = 0.1, c = "black") {
				translate(v = [8, -6, 3]) {
					cube(size = [1, 1, 1]);
				}
			}
			/*Node thing.chamber[0].thingy.v13*/
			color(alpha = 0.1, c = "black") {
				translate(v = [8, -6, 2]) {
					cube(size = [1, 1, 1]);
				}
			}
			/*Node thing.chamber[0].thingy.v4*/
			color(alpha = 0.1, c = "black") {
				translate(v = [7, -8, 5]) {
					cube(size = [1, 1, 1]);
				}
			}
			/*Node thing.chamber[0].thingy.v6*/
			color(alpha = 0.1, c = "black") {
				translate(v = [8, -8, 3]) {
					cube(size = [1, 1, 1]);
				}
			}
			/*Node thing.chamber[0].thingy.v8*/
			color(alpha = 0.1, c = "black") {
				translate(v = [8, -8, 4]) {
					cube(size = [1, 1, 1]);
				}
			}
			/*Node thing.chamber[1].thingy.v12*/
			color(alpha = 0.1, c = "black") {
				translate(v = [8, -8, 1]) {
					cube(size = [1, 1, 1]);
				}
			}
			/*Node thing.chamber[1].thingy.v13*/
			color(alpha = 0.1, c = "black") {
				translate(v = [8, -6, 1]) {
					cube(size = [1, 1, 1]);
				}
			}
			/*Node thing.dead_bead*/
			color(alpha = 0.1, c = "black") {
				translate(v = [8, -8, 2]) {
					cube(size = [1, 1, 1]);
				}
			}
			/*Node thing.dead_buffer*/
			color(alpha = 0.1, c = "black") {
				translate(v = [7, -8, 3]) {
					cube(size = [1, 1, 1]);
				}
			}
			/*Node thing.dead_cell*/
			color(alpha = 0.1, c = "black") {
				translate(v = [7, -8, 4]) {
					cube(size = [1, 1, 1]);
				}
			}
			/*Node thing.elute*/
			color(alpha = 0.1, c = "black") {
				translate(v = [6, -8, 4]) {
					cube(size = [1, 1, 1]);
				}
			}
			/*Node thing.lysis*/
			color(alpha = 0.1, c = "black") {
				translate(v = [6, -8, 6]) {
					cube(size = [1, 1, 1]);
				}
			}
			/*Node thing.wash*/
			color(alpha = 0.1, c = "black") {
				translate(v = [5, -8, 4]) {
					cube(size = [1, 1, 1]);
				}
			}
		}
		/*Edges shell 7*/
		union();
	}
	/*Shell 8*/
	union() {
		%/*Nodes shell 8*/
		union();
		/*Edges shell 8*/
		union();
	}
}
